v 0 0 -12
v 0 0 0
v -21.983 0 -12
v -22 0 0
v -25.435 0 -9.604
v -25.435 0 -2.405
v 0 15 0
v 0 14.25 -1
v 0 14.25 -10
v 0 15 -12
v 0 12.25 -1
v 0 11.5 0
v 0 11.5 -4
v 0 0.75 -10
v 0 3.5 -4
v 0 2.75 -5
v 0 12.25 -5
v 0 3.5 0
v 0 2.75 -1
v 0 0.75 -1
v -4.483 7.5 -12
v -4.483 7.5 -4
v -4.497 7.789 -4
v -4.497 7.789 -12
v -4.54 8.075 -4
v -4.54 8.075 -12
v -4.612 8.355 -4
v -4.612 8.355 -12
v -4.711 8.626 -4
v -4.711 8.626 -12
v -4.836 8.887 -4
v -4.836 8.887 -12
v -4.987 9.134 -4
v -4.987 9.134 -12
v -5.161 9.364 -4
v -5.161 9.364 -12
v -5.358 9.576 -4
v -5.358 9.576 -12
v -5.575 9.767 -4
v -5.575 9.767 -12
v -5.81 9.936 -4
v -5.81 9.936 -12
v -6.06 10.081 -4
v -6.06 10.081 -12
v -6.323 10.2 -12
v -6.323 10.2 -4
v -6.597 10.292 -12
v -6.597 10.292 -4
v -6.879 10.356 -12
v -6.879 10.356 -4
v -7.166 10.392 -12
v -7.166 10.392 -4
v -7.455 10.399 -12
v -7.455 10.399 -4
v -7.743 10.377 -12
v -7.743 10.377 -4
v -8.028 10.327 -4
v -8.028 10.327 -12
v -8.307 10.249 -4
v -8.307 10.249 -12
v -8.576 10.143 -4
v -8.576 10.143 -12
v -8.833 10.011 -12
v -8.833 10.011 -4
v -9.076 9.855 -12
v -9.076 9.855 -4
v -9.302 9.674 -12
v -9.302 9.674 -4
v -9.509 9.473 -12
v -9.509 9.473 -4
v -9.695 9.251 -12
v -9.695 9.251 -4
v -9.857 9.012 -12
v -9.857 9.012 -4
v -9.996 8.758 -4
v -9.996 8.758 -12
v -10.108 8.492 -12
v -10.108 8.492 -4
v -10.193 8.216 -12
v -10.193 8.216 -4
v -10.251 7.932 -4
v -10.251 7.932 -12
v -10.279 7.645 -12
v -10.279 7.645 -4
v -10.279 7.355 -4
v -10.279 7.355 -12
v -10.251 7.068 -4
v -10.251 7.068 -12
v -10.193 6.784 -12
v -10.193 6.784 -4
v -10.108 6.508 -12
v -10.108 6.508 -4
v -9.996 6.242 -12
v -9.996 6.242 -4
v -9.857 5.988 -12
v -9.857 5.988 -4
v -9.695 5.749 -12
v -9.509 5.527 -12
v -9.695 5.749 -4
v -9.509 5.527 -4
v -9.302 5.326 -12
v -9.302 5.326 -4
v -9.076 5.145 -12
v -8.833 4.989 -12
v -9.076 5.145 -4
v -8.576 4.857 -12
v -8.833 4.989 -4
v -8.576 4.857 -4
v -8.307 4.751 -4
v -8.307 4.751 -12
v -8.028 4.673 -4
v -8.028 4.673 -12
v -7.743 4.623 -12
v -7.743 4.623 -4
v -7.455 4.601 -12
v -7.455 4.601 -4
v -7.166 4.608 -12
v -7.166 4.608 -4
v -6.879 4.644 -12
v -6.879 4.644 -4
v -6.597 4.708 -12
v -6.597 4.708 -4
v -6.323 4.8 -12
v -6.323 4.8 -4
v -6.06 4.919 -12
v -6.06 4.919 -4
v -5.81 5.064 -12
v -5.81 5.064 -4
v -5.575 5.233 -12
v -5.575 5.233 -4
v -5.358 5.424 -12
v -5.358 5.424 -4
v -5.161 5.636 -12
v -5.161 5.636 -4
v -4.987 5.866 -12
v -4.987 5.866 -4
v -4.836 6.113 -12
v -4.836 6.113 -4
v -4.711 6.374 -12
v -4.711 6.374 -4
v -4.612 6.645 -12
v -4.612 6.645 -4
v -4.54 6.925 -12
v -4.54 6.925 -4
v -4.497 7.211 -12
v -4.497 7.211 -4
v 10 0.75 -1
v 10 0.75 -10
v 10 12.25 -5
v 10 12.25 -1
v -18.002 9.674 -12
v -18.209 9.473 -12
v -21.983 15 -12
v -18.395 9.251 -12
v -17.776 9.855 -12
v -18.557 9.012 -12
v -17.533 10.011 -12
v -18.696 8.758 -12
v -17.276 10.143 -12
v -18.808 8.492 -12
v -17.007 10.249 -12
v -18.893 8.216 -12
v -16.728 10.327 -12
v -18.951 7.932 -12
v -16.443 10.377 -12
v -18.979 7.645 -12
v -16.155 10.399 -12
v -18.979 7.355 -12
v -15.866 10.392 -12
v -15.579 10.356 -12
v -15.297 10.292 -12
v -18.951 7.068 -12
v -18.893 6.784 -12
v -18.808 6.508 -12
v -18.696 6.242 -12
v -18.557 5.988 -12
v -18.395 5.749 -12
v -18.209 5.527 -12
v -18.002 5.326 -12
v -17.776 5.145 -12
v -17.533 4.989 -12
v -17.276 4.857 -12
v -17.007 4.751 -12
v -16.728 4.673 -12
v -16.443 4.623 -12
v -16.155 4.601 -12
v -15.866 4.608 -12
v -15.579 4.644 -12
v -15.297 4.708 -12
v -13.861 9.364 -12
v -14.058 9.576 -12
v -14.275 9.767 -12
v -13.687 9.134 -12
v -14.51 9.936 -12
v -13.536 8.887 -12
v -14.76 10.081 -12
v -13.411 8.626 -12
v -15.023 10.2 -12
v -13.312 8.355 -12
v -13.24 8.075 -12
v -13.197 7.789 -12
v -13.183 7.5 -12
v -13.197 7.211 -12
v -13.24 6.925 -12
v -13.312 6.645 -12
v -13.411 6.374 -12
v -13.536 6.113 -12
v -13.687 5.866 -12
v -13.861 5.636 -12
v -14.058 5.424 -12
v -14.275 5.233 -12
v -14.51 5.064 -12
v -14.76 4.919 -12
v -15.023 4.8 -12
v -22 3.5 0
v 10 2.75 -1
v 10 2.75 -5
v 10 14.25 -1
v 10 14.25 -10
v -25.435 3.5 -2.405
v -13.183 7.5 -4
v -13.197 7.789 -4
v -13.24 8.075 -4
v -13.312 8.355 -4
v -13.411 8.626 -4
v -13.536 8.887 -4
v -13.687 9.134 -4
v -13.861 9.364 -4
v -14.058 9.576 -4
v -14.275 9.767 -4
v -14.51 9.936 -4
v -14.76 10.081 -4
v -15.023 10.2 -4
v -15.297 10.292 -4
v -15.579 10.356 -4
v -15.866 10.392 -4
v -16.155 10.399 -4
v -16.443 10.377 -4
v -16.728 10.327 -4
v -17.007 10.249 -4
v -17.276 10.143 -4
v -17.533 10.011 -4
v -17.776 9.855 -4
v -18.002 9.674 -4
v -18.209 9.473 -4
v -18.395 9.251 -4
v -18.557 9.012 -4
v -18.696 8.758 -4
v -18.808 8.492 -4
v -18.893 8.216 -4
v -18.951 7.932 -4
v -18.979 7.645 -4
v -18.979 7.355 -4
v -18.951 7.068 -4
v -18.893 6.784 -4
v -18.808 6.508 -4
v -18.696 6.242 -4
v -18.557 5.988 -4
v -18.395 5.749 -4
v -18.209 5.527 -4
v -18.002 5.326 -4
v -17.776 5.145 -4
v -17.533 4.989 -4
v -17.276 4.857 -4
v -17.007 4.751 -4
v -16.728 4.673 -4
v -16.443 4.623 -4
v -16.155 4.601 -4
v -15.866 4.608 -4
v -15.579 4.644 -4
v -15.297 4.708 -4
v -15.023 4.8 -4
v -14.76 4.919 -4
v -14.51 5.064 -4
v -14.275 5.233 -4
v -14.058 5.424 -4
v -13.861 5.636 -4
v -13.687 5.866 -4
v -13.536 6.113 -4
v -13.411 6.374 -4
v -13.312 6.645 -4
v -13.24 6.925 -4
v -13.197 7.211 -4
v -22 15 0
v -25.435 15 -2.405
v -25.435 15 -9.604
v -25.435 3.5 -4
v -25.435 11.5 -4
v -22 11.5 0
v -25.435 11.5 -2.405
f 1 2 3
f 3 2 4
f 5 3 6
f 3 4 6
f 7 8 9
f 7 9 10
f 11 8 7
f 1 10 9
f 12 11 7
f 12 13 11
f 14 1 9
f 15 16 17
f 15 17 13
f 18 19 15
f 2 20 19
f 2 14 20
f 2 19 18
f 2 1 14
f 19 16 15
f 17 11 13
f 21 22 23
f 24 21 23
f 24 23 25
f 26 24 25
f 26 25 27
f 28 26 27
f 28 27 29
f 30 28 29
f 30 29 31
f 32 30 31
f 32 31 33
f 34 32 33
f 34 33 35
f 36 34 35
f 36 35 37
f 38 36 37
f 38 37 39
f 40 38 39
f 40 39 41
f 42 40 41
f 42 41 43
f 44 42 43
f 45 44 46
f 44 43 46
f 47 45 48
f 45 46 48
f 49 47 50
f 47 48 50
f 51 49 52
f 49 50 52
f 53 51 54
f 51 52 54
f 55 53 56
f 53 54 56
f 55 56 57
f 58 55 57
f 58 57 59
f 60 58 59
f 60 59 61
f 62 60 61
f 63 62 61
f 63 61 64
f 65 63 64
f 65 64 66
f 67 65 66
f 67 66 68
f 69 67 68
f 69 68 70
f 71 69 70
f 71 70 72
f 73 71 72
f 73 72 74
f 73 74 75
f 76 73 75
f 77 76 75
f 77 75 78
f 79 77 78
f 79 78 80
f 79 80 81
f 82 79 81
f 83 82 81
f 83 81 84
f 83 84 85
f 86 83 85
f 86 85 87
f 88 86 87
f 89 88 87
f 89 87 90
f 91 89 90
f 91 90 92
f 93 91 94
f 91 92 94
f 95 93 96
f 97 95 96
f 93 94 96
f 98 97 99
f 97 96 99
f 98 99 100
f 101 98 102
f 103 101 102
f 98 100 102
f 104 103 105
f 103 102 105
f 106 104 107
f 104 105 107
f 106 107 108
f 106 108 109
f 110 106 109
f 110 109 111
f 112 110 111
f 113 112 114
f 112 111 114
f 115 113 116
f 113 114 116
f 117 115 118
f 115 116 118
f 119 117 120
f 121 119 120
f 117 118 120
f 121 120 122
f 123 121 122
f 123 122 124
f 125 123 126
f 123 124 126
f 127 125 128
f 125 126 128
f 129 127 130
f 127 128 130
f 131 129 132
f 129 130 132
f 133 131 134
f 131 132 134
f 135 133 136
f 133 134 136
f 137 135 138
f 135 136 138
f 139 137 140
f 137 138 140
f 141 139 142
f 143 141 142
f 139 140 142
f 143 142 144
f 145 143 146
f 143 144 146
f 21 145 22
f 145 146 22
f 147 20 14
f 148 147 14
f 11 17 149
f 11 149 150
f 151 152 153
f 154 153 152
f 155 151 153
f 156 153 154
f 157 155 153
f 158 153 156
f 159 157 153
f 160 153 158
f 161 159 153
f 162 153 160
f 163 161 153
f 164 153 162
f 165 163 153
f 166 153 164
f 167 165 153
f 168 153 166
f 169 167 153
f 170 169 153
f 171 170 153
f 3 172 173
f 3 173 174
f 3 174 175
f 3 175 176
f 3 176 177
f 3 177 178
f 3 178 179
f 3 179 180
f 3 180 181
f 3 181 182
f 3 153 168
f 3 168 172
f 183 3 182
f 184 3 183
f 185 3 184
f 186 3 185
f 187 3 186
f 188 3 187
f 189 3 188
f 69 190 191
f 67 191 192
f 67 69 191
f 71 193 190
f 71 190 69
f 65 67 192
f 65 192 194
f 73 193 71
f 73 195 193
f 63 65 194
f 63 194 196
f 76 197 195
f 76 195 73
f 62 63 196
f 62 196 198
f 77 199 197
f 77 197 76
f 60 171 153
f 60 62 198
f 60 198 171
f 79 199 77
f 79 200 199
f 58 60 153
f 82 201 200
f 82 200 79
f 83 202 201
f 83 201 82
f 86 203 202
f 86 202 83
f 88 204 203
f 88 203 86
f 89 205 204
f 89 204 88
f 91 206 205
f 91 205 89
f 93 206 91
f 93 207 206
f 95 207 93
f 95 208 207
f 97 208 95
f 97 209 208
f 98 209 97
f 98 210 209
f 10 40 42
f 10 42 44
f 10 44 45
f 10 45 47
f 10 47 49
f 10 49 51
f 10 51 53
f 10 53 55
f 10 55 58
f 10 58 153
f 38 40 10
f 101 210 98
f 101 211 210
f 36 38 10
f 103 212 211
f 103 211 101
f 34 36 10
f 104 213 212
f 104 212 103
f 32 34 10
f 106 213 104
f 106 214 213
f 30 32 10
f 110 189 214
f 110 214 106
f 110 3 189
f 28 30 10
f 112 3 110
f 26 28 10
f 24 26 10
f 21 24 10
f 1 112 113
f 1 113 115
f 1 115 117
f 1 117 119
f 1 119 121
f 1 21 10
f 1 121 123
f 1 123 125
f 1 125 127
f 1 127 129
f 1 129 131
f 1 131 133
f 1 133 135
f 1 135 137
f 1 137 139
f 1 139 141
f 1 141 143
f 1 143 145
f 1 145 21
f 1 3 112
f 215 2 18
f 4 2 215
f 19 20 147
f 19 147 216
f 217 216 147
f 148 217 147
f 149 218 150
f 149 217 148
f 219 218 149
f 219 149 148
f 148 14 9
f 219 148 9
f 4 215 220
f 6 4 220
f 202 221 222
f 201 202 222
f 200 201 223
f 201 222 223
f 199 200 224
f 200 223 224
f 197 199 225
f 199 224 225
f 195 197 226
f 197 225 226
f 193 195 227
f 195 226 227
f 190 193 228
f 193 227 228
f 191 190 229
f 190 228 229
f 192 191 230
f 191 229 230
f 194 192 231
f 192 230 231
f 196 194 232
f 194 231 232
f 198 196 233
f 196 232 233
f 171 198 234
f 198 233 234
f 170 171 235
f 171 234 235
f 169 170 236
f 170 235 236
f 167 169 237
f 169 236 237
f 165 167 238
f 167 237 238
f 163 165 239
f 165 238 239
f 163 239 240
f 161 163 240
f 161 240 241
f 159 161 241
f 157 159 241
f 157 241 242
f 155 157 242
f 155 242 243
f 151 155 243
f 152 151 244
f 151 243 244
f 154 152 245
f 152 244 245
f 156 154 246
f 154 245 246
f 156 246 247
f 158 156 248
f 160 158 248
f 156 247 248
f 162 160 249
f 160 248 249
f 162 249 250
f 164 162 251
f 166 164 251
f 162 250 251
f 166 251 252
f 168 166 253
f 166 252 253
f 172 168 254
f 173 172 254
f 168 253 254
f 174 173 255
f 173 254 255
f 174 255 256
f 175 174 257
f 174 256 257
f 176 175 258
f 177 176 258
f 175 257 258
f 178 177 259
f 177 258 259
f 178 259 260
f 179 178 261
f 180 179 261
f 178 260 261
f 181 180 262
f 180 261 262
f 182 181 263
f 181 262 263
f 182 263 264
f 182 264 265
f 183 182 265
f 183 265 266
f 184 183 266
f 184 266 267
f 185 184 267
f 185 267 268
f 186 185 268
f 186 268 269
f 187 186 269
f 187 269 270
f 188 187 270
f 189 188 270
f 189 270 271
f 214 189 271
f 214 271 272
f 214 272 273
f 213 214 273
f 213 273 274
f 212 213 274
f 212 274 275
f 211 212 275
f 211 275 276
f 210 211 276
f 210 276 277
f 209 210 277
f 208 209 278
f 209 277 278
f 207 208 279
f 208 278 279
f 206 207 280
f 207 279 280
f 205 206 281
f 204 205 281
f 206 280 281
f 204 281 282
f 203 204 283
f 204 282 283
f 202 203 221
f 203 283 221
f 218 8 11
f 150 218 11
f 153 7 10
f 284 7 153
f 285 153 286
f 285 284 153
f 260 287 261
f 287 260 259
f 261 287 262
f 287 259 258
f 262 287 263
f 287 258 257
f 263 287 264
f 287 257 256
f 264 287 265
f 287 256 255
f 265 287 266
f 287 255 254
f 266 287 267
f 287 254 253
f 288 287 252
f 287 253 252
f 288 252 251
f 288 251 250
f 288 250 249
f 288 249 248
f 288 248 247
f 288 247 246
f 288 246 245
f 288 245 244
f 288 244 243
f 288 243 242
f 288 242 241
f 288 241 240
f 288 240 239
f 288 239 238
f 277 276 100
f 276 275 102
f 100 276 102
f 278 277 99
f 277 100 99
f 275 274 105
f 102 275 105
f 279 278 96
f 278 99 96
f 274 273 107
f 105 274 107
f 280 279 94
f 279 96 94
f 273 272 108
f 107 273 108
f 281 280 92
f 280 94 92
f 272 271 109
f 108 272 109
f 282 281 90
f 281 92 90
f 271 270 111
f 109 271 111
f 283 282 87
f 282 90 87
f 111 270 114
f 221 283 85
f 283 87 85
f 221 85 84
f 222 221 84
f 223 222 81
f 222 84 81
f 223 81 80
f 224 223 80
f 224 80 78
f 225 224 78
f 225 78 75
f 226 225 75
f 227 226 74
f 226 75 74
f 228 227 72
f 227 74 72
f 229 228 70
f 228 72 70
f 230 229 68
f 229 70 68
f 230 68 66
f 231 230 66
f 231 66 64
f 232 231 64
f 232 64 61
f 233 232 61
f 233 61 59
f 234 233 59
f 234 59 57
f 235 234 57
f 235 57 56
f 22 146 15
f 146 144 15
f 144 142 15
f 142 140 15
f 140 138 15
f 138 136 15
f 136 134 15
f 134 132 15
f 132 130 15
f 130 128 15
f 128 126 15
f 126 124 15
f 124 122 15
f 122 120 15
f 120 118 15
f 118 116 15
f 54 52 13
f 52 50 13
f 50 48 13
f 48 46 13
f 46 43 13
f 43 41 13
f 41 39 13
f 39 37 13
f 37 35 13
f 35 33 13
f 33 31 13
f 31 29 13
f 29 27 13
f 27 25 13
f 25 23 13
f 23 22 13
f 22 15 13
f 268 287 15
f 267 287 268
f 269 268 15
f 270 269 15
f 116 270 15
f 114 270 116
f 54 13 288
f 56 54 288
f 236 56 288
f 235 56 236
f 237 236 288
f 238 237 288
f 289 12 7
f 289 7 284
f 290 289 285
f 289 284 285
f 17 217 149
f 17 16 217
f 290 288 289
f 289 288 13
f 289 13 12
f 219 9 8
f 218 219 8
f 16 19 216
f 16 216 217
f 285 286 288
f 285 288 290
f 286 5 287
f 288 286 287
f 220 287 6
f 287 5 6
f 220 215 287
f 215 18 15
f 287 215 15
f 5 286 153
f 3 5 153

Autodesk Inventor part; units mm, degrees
ref_plane "YZ Plane" through (0, 0, 0) normal (1, 0, 0) x (0, 1, 0)
ref_plane "XZ Plane" through (0, 0, 0) normal (0, 1, 0) x (-1, 0, 0)
ref_plane "XY Plane" through (0, 0, 0) normal (0, 0, 1) x (1, 0, 0)
sketch "Náčrt1" plane through (0, 0, 0) normal (0, 1, 0) x (-1, 0, 0)
  line L0 (0, 0) -> (50, 0)
  line L1 (50, 0) -> (66.0697, -19.1511)
  line L2 (50, 0) -> (75, 0) construction
  line L3 (66.0697, -19.1511) -> (58.4092, -25.579)
  line L4 (0, -12) -> (0, 0)
  line L5 (58.6554, -25.3724) -> (47.4347, -12)
  line L6 (47.4347, -12) -> (0, -12)
  dimension "d0" = 50
  dimension "d2" = 25
  dimension "d3" = 50
  dimension "d4" = 10
  dimension "d5" = 12
extrude "Vysunutí1" add sketch "Náčrt1" along normal blind 15
sketch "Náčrt11" plane through (0, 0, 0) normal (1, 0, 0) x (0, 0, -1)
  line L0 (0, 0) -> (0, 15) projected
  line L1 (0, 7.5) -> (12, 7.5)
  line L2 (12, 0) -> (12, 15) projected
  line L3 (0, 3.5) -> (4, 3.5)
  line L4 (4, 3.5) -> (4, 11.5)
  line L5 (4, 11.5) -> (0, 11.5)
  line L6 (0, 11.5) -> (0, 3.5)
  point P0 (0, 7.5)
  point P1 (0, 11.5)
  dimension "d64" = 4
  dimension "d65" = 8
extrude "Vysunutí10" cut sketch "Náčrt11" against normal through all
sketch "Náčrt21" plane through (-66.0697, 0, -19.1511) normal (-0.6427876, 0, -0.7660444) x (-0.7660444, 0, 0.6427876)
  line L0 (0, 0) -> (0, 15) projected
  line L1 (0, 3.5) -> (-4, 3.5)
  line L2 (-4, 3.5) -> (-4, 11.5)
  line L3 (-4, 11.5) -> (0, 11.5)
  line L4 (0, 11.5) -> (0, 3.5)
  point P0 (-38.3022, 0)
  point P1 (0, 7.5)
  point P2 (0, 11.5)
  dimension "d68" = 4
  dimension "d69" = 8
extrude "Vysunutí11" cut sketch "Náčrt21" against normal through all
sketch "Náčrt30" plane through (0, 0, -12) normal (0, 0, -1) x (-1, 0, 0)
  point P0 (0, 0)
sketch "Náčrt31" plane through (0, 0, 0) normal (1, 0, 0) x (0, 0, -1)
  point P0 (0, 0)
sketch "Náčrt32" plane through (0, 0, 0) normal (0, -1, 0) x (1, 0, 0)
  line L0 (-47.4347, -12) -> (-58.6554, -25.3724) projected
  line L1 (-47.4347, -12) -> (-47.4347, 0)
  line L2 (-47.4347, -12) -> (-58.6554, -25.3724)
  line L3 (-58.6554, -25.3724) -> (-66.0697, -19.1511) projected
  line L4 (-66.0697, -19.1511) -> (-50, 0)
  line L5 (-50, 0) -> (-47.4347, 0)
  line L6 (-50, 0) -> (0, 0) projected
  point P0 (-47.4347, 0)
extrude "Vysunutí16" add sketch "Náčrt32" against normal through all
sketch "Náčrt33" plane through (0, 0, 0) normal (0, -1, 0) x (1, 0, 0)
  line L0 (-47.4347, -12) -> (-58.6554, -25.3724) projected
  line L1 (-47.4347, -4) -> (-47.4347, 0) projected
  line L2 (-47.4347, -12) -> (-47.4347, 0)
  line L3 (-66.0697, -19.1511) -> (-50, 0) projected
  line L4 (-47.4347, 0) -> (-50, 0)
  line L5 (-50, 0) -> (-66.0697, -19.1511)
  line L6 (-50, 0) -> (0, 0) projected
  line L7 (-66.0697, -19.1511) -> (-50, 0) projected
  line L8 (-58.6554, -25.3724) -> (-66.0697, -19.1511) projected
  line L9 (-47.4347, -12) -> (-58.6554, -25.3724) projected
  line L10 (0, -12) -> (-47.4347, -12) projected
  line L11 (0, 0) -> (0, -12) projected
  line L12 (-58.6554, -25.3724) -> (-66.0697, -19.1511) projected
  line L13 (-66.0697, -19.1511) -> (-58.6554, -25.3724)
  line L14 (-58.6554, -25.3724) -> (-47.4347, -12)
extrude "Vysunutí17" cut sketch "Náčrt33" against normal through all contours L0 L8 L3 L4 L1 L2
sketch "Náčrt34" plane through (0, 0, 0) normal (0, -1, 0) x (1, 0, 0)
  line L0 (-47.4347, 0) -> (-47.4347, -12) projected
  line L1 (-47.4347, 0) -> (-47.4347, -12) projected
  line L2 (0, -12) -> (-47.4347, -12) projected
  line L3 (0, 0) -> (0, -12) projected
  line L4 (-47.4347, 0) -> (0, 0) projected
  line L5 (0, -12) -> (-47.4347, -12) projected
  line L6 (-44, -12) -> (-47.4347, -9.595)
  line L7 (-44, -12) -> (-39.807, -12) construction
  line L8 (-47.4347, -9.595) -> (-47.4347, -12)
  line L9 (-44, -12) -> (-47.4347, -12)
  line L10 (0, 0) -> (-47.4347, 0) projected
  line L11 (-44, 0) -> (-47.0563, -2.14)
  line L12 (-44, 0) -> (-40.269, 0) construction
  line L13 (-47.0563, -2.14) -> (-47.4347, -2.405)
  line L14 (-47.4347, -2.405) -> (-47.4347, 0)
  line L15 (-44, 0) -> (-47.4347, 0)
  dimension "d99" = 145
  dimension "d100" = 145
extrude "Vysunutí18" cut sketch "Náčrt34" against normal through all contours L4 L11 L13 L0 | L6 L2 L0
sketch "Náčrt39" plane through (0, 0, 0) normal (1, 0, 0) x (0, 0, -1)
  line L0 (0, 11.5) -> (0, 15) projected
  line L1 (12, 0) -> (12, 15) projected
  line L2 (0, 0) -> (0, 3.5) projected
  line L3 (1, 0.75) -> (10, 0.75)
  line L4 (10, 14.25) -> (1, 14.25)
  line L5 (1, 14.25) -> (1, 12.2503)
  line L6 (4, 4.7) -> (4, 10.3) projected
  line L7 (5, 12.2503) -> (1, 12.2503)
  line L8 (1, 0.75) -> (1, 2.7496)
  line L9 (1, 2.7496) -> (5, 2.7496)
  line L10 (5, 2.7496) -> (5, 12.2503)
  line L11 (10, 0.75) -> (10, 14.25)
  line L12 (4, 7.5) -> (12, 7.5)
  line L13 (12, 9.95) -> (12, 5.05) projected
  point P0 (1, 1.7498)
  point P1 (5, 7.5)
  point P2 (1, 13.2502)
  point P3 (10, 7.5)
  point P4 (5.5, 0.75)
  dimension "d119" = 13.5
extrude "Vysunutí22" add sketch "Náčrt39" along normal blind 10
sketch "Náčrt40" plane through (0, 0, 0) normal (0, -1, 0) x (1, 0, 0)
  line L0 (-47.4347, -2.405) -> (-47.4347, -9.595) projected
  line L1 (-47.4347, -6) -> (0, -6)
  line L2 (-44, 0) -> (-47.4347, -2.405) projected
  line L3 (-47.4347, -2.405) -> (-47.4347, -9.595) projected
  line L4 (-47.4347, -9.595) -> (-44, -12) projected
  line L5 (0, -12) -> (-44, -12) projected
  line L6 (0, 0) -> (0, -12) projected
  line L7 (-44, 0) -> (0, 0) projected
  line L8 (-27.885, -6) -> (-22.985, -6) projected
  line L9 (-25.435, -6) -> (-25.435, 0)
  line L10 (-25.435, -6) -> (-25.435, -12)
  dimension "d124" = 47.4347
extrude "Vysunutí24" cut sketch "Náčrt40" against normal through all contours L2 L7 L9 L1 L0 | L1 L10 L5 L4 L0
sketch "Náčrt41" plane through (0, 15, 0) normal (0, 1, 0) x (1, 0, 0)
  line L0 (-25.435, 0) -> (0, 0) projected
  line L1 (-25.435, 0) -> (-22, 0)
  line L2 (-22, 0) -> (-25.435, 2.4052)
  line L3 (-25.435, 12) -> (-25.435, 0) projected
  line L4 (-25.435, 2.4052) -> (-25.435, 0)
  line L5 (-22, 0) -> (-25.435, 0)
  line L6 (0, 12) -> (-25.435, 12) projected
  line L7 (-22, 12) -> (-17.9846, 12) construction
  line L8 (-25.435, 9.6038) -> (-21.9829, 12)
  line L9 (-25.435, 9.6038) -> (-25.435, 12)
  line L10 (-21.9829, 12) -> (-25.435, 12)
  dimension "d127" = 3.435
  dimension "d128" = 35
extrude "Vysunutí25" cut sketch "Náčrt41" against normal through all
sketch "Náčrt42" plane through (0, 3.5, -4) normal (0, 0, 1) x (1, 0, 0)
  line L0 (-25.435, 8) -> (-25.435, 0) projected
  line L1 (-25.435, 4) -> (0, 4)
  line L2 (0, -3.5) -> (0, 11.5) projected
  line L3 (-21.9829, -3.5) -> (-21.9829, 11.5) projected
  line L4 (-21.9829, 4) -> (-16.0829, 4)
  circle A0 centre (-16.0829, 4) radius 2.9
  line L5 (-13.1829, 4) -> (-10.1829, 4)
  circle A1 centre (-7.3829, 4) radius 2.9
  line L6 (-10.2829, 7.4092) -> (-10.2829, 0.965)
  dimension "d133" = 5.8
  dimension "d132" = 5.9
  dimension "d134" = 3
  dimension "d136" = 5.8
extrude "Vysunutí26" cut sketch "Náčrt42" against normal through all
properties part number "chodecsemafor"
